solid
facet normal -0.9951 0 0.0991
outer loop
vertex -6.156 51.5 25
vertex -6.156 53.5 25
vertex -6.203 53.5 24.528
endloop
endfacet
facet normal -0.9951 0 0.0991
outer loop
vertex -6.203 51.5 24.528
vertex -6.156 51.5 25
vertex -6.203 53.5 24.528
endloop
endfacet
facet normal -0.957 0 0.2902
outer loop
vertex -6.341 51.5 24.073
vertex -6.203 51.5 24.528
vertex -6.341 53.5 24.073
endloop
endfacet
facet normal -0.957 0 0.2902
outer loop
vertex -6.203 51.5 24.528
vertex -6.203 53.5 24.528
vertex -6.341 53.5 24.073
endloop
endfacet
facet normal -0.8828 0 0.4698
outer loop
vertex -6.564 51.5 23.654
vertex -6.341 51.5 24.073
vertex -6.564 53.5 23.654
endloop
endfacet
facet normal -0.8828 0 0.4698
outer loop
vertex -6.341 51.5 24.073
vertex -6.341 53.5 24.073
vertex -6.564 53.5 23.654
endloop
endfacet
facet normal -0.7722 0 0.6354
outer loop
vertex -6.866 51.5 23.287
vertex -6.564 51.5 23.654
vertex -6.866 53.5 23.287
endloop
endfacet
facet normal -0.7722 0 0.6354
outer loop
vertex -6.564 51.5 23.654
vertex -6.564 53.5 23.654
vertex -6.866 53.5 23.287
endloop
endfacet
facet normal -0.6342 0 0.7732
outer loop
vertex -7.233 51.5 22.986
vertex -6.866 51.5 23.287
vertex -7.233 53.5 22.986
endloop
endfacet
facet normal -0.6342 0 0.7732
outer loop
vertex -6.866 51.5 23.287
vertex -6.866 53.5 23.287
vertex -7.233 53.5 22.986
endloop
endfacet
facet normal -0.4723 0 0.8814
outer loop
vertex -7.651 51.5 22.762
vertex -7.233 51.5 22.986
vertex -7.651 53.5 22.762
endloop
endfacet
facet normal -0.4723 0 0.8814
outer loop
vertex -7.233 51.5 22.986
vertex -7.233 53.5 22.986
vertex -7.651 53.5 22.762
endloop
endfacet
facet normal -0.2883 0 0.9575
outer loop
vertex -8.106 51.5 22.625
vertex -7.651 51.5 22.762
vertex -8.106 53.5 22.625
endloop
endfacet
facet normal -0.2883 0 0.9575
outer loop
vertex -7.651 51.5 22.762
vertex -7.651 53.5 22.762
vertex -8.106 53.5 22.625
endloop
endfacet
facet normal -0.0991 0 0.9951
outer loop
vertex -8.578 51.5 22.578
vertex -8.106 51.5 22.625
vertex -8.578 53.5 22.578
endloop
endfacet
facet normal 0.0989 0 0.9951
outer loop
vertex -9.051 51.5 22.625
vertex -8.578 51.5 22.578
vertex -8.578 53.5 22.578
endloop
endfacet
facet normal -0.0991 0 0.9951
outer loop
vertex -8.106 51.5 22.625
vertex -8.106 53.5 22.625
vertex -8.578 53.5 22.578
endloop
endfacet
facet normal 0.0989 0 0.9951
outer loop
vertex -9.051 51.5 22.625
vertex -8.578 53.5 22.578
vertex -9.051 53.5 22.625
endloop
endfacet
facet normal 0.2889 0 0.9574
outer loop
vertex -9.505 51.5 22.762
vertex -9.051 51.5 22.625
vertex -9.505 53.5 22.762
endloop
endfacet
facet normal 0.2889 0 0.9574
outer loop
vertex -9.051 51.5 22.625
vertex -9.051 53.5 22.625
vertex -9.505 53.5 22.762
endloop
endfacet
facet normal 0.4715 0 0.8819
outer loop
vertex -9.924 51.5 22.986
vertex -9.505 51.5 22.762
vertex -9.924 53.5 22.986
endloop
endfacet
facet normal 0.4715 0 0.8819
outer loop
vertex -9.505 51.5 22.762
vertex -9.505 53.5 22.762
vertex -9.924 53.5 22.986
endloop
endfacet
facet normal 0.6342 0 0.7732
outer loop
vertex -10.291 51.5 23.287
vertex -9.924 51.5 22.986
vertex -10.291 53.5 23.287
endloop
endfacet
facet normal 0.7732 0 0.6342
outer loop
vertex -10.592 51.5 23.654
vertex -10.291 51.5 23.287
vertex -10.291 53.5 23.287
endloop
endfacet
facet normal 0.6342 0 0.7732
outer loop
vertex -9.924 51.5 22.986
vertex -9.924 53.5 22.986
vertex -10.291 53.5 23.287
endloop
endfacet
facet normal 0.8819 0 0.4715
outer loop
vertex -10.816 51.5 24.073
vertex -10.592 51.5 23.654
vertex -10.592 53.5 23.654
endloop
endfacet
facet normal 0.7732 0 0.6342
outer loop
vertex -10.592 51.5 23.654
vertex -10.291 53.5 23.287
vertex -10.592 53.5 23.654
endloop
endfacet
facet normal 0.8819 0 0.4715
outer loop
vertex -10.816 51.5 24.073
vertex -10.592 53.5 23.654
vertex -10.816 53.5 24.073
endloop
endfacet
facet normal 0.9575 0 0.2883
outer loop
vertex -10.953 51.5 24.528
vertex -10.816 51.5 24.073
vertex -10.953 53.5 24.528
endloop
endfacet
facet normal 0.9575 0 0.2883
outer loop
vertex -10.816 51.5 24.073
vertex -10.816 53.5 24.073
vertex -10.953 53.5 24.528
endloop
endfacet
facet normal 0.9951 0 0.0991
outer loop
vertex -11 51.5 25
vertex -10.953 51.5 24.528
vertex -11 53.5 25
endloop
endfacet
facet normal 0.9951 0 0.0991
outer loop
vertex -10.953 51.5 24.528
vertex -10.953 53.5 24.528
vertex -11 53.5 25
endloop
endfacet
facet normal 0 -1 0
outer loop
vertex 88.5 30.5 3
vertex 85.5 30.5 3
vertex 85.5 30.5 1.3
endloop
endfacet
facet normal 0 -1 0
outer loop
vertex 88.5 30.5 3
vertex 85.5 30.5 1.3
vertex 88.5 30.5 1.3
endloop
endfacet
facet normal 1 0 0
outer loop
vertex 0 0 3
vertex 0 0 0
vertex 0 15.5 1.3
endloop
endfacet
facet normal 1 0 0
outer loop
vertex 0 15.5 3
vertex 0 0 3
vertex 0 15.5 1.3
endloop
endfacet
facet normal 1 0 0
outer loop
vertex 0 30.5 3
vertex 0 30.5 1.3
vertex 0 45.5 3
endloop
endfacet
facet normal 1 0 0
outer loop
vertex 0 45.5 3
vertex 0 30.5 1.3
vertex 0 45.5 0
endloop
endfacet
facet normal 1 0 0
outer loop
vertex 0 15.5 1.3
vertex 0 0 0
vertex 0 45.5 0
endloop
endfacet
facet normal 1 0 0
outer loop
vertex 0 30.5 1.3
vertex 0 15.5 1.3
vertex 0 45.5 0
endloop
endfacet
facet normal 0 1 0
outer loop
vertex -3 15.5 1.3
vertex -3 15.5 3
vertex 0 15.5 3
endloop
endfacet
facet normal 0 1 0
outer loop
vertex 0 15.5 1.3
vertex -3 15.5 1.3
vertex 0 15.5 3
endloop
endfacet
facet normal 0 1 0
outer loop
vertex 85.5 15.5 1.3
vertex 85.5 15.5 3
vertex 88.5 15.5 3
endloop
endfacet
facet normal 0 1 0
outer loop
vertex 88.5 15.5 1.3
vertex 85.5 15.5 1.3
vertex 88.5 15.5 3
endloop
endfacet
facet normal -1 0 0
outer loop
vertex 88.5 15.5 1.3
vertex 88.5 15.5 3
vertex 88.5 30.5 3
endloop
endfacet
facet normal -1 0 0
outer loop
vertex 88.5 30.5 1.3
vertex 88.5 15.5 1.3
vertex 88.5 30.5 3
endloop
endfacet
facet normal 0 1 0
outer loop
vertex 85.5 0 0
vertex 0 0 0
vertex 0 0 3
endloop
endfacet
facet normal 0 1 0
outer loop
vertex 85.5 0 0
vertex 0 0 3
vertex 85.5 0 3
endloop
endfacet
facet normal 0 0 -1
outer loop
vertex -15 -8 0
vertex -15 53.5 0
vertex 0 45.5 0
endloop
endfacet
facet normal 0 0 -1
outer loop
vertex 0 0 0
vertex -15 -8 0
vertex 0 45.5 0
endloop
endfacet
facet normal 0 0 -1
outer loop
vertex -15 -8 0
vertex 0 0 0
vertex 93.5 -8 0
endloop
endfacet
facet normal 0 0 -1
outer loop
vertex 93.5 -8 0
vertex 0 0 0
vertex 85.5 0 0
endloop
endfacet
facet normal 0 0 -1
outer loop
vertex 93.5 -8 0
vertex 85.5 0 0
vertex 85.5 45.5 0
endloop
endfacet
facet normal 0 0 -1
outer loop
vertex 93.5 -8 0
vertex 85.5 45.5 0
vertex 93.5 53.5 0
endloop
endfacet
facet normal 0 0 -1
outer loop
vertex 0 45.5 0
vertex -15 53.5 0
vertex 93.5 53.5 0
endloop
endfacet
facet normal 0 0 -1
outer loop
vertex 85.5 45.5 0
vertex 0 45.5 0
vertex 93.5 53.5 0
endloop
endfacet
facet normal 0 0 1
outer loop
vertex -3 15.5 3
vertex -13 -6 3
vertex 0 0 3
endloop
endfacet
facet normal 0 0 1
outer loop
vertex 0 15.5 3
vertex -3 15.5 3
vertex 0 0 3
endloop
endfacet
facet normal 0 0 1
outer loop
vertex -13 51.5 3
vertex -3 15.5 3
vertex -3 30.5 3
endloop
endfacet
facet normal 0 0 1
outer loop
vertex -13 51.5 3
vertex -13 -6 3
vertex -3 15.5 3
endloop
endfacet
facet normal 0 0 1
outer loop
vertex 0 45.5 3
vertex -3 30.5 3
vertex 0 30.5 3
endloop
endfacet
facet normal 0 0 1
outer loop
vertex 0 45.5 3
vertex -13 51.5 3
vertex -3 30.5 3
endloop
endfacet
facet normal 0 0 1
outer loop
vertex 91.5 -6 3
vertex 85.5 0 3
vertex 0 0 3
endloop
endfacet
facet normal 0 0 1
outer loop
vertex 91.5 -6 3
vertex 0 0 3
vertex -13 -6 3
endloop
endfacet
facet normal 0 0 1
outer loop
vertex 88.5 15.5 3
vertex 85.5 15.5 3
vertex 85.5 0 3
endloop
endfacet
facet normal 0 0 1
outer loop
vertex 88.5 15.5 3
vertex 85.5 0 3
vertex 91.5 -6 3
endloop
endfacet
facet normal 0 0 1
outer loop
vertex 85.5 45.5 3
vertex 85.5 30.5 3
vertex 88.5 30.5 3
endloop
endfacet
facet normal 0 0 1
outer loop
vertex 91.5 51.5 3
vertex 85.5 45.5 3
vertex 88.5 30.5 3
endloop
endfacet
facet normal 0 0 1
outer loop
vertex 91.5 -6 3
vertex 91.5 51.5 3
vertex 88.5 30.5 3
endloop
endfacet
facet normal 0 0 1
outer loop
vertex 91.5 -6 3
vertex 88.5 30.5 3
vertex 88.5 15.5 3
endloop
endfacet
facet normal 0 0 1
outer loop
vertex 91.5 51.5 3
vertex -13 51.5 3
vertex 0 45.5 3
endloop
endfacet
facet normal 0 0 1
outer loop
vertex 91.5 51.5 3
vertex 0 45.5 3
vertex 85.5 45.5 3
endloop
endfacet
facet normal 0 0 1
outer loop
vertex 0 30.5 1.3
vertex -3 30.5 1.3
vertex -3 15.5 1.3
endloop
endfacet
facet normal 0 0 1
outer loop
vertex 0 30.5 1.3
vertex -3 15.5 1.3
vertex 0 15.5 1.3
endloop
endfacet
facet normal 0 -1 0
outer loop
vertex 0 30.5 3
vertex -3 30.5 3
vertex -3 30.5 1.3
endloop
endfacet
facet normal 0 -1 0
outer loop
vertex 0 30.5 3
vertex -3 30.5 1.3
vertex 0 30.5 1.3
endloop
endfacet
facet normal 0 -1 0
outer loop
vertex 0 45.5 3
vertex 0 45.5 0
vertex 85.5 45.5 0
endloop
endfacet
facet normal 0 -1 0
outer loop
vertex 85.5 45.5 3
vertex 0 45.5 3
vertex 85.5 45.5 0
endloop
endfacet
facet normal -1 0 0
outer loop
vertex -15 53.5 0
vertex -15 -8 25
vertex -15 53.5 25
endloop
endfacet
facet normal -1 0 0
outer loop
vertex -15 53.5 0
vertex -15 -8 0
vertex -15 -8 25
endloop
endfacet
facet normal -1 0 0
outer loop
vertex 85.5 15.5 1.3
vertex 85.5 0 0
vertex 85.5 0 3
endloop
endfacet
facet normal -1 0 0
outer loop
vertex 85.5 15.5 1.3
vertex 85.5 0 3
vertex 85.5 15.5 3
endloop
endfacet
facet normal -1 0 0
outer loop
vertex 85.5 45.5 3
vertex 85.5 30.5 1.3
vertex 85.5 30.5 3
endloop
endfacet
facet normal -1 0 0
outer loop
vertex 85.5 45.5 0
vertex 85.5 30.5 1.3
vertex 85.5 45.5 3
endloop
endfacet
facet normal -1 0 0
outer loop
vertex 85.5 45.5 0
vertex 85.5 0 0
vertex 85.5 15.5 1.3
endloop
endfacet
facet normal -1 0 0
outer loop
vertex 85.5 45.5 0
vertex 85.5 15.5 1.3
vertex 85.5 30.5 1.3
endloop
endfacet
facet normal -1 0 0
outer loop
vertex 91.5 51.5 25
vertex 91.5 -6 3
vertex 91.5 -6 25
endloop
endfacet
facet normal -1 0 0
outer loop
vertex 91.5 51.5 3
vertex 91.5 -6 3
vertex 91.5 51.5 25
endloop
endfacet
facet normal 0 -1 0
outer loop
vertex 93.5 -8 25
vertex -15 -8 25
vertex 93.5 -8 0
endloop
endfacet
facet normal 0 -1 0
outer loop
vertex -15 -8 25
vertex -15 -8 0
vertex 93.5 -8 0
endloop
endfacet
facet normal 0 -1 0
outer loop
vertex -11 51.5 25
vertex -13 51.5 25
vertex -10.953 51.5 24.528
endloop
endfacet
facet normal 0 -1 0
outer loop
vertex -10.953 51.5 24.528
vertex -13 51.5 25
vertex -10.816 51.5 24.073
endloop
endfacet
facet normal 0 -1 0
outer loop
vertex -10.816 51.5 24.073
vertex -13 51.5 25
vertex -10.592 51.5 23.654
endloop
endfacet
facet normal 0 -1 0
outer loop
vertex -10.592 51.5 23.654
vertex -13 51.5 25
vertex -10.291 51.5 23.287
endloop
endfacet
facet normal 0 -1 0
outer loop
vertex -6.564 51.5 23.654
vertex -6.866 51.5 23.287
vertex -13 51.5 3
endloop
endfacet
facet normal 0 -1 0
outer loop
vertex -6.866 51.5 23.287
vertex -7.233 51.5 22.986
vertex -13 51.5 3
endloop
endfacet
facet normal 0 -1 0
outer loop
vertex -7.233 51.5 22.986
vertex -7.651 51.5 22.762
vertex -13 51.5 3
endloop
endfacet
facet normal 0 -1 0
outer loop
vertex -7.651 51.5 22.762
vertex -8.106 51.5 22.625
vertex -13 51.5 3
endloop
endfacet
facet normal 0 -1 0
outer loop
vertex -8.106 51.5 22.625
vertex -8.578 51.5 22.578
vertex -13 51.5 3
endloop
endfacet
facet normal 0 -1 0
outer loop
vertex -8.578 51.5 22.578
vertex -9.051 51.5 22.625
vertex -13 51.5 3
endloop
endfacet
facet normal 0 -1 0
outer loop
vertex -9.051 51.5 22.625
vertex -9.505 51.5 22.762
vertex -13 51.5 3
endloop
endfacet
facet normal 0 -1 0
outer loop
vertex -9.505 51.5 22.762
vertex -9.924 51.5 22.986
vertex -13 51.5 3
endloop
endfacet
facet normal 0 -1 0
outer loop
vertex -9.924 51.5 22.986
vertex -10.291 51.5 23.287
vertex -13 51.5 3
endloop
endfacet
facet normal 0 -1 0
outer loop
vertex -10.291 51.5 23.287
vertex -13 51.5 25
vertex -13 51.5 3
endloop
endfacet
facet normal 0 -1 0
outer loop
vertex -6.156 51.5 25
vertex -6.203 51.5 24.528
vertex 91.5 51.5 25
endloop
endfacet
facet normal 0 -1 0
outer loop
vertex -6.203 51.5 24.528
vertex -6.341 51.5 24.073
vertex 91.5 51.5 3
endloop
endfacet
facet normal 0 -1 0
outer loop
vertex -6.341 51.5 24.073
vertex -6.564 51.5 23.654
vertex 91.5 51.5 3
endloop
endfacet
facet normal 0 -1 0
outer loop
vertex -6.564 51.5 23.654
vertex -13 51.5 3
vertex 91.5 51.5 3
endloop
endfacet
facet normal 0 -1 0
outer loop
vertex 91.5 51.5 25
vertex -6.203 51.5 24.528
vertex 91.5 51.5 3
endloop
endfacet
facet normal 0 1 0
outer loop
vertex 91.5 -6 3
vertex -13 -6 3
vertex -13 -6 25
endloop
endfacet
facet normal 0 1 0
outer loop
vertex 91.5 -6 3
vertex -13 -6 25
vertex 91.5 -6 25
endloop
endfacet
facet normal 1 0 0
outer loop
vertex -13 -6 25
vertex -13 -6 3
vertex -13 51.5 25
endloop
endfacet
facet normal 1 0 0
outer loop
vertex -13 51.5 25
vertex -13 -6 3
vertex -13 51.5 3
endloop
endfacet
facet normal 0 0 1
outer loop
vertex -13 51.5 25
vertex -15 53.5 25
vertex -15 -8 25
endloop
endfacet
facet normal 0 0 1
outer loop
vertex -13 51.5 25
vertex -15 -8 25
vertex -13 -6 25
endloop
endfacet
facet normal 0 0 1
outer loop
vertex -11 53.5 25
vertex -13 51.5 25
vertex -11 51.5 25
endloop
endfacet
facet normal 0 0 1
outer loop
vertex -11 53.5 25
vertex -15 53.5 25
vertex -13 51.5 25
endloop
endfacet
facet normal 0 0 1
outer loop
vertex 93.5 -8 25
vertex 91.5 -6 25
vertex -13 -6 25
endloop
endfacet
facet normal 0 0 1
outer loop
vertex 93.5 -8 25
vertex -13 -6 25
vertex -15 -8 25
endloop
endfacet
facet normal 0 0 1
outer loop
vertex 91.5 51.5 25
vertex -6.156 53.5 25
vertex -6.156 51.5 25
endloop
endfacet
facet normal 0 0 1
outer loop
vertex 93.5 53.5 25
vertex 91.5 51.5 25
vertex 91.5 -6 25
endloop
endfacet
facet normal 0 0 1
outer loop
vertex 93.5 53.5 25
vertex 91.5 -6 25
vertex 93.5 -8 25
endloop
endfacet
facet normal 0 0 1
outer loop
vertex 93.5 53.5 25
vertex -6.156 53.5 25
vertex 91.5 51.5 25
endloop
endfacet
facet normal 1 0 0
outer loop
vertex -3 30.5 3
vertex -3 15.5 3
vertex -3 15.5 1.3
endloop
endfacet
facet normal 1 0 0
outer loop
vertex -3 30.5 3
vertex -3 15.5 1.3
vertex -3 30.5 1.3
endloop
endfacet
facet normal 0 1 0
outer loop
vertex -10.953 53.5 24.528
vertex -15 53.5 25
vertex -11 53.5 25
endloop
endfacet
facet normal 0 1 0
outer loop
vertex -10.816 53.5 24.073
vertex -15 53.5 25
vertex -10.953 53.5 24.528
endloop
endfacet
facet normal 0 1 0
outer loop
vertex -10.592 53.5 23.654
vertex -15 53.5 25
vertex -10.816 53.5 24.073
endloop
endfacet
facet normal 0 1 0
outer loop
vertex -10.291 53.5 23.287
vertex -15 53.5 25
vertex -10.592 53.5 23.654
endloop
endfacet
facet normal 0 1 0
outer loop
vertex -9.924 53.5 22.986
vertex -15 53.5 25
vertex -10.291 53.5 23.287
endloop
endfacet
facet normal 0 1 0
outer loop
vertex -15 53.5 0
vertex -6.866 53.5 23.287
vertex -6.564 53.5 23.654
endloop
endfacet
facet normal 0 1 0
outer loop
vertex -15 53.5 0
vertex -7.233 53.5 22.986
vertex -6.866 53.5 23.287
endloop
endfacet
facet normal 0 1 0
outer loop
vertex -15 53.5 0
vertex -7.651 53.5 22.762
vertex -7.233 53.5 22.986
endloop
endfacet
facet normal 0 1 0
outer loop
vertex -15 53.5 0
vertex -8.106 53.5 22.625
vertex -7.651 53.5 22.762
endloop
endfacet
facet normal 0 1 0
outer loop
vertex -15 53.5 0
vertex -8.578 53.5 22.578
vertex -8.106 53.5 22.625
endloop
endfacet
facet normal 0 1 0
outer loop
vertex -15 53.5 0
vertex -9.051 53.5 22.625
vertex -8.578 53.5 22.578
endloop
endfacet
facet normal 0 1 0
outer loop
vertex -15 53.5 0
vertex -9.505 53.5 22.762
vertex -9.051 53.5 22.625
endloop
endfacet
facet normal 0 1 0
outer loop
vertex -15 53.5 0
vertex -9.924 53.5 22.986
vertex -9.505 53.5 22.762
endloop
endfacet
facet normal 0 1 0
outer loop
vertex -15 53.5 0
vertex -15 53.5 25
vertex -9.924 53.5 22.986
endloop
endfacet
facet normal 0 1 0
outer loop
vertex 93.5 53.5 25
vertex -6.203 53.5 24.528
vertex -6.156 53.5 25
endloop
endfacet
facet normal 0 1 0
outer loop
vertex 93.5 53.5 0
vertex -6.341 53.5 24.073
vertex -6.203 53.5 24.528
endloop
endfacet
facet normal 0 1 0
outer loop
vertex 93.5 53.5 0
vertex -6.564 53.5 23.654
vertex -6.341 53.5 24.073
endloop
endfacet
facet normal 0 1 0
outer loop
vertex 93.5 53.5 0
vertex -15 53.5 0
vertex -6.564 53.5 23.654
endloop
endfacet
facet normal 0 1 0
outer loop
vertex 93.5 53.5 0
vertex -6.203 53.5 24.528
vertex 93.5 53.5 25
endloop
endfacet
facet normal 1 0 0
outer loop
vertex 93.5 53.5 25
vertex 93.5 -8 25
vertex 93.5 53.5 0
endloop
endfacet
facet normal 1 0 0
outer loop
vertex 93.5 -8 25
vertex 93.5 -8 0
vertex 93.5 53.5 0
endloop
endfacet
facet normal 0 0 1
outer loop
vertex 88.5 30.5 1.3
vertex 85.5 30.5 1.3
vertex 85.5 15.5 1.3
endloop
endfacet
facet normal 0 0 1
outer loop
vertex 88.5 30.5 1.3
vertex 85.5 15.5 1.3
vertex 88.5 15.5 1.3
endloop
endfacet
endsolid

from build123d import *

# Parameters (mm, degrees)
F0_W     = 108.5
F0_H     = 61.5
F0_W_2   = 85.5
F0_H_2   = 45.5
F1_DEPTH = 3
F2_W     = 3
F2_H     = 15
F3_DEPTH = 1.7
F4_W     = 108.5
F4_H     = 61.5
F4_W_2   = 104.5
F4_H_2   = 57.5
F5_DEPTH = 22
F7_DEPTH = 2


with BuildPart() as f1:
    # F0 (on Top) → F1 (new body)
    with BuildSketch(Plane.XY):
        with Locations((39.25, 22.75)):
            Rectangle(F0_W, F0_H)
        with Locations((42.75, 22.75)):
            Rectangle(F0_W_2, F0_H_2, mode=Mode.SUBTRACT)
    extrude(amount=F1_DEPTH)

    # F2 (on face) → F3 (cut, through all)
    with BuildSketch(Plane.XY.offset(3)):
        with Locations((-1.5, 23)):
            Rectangle(F2_W, F2_H)
        with Locations((87, 23)):
            Rectangle(F2_W, F2_H)
    extrude(amount=-F3_DEPTH, mode=Mode.SUBTRACT)

    # F4 (on face) → F5 (join)
    with BuildSketch(Plane.XY.offset(3)):
        with Locations((39.25, 22.75)):
            Rectangle(F4_W, F4_H)
        with Locations((39.25, 22.75)):
            Rectangle(F4_W_2, F4_H_2, mode=Mode.SUBTRACT)
    extrude(amount=F5_DEPTH)

    # F6 (on face) → F7 (cut, through all)
    with BuildSketch(Plane(origin=(0, 53.5, 0), x_dir=(-1, 0, 0), z_dir=(0, 1, 0))):
        with BuildLine():
            Line((11, 25), (6.1561632305, 25))
            ThreePointArc((6.1561632305, 25), (8.5780816153, 22.5780816153), (11, 25))
        make_face()
    extrude(amount=-F7_DEPTH, mode=Mode.SUBTRACT)


solid = f1.part
